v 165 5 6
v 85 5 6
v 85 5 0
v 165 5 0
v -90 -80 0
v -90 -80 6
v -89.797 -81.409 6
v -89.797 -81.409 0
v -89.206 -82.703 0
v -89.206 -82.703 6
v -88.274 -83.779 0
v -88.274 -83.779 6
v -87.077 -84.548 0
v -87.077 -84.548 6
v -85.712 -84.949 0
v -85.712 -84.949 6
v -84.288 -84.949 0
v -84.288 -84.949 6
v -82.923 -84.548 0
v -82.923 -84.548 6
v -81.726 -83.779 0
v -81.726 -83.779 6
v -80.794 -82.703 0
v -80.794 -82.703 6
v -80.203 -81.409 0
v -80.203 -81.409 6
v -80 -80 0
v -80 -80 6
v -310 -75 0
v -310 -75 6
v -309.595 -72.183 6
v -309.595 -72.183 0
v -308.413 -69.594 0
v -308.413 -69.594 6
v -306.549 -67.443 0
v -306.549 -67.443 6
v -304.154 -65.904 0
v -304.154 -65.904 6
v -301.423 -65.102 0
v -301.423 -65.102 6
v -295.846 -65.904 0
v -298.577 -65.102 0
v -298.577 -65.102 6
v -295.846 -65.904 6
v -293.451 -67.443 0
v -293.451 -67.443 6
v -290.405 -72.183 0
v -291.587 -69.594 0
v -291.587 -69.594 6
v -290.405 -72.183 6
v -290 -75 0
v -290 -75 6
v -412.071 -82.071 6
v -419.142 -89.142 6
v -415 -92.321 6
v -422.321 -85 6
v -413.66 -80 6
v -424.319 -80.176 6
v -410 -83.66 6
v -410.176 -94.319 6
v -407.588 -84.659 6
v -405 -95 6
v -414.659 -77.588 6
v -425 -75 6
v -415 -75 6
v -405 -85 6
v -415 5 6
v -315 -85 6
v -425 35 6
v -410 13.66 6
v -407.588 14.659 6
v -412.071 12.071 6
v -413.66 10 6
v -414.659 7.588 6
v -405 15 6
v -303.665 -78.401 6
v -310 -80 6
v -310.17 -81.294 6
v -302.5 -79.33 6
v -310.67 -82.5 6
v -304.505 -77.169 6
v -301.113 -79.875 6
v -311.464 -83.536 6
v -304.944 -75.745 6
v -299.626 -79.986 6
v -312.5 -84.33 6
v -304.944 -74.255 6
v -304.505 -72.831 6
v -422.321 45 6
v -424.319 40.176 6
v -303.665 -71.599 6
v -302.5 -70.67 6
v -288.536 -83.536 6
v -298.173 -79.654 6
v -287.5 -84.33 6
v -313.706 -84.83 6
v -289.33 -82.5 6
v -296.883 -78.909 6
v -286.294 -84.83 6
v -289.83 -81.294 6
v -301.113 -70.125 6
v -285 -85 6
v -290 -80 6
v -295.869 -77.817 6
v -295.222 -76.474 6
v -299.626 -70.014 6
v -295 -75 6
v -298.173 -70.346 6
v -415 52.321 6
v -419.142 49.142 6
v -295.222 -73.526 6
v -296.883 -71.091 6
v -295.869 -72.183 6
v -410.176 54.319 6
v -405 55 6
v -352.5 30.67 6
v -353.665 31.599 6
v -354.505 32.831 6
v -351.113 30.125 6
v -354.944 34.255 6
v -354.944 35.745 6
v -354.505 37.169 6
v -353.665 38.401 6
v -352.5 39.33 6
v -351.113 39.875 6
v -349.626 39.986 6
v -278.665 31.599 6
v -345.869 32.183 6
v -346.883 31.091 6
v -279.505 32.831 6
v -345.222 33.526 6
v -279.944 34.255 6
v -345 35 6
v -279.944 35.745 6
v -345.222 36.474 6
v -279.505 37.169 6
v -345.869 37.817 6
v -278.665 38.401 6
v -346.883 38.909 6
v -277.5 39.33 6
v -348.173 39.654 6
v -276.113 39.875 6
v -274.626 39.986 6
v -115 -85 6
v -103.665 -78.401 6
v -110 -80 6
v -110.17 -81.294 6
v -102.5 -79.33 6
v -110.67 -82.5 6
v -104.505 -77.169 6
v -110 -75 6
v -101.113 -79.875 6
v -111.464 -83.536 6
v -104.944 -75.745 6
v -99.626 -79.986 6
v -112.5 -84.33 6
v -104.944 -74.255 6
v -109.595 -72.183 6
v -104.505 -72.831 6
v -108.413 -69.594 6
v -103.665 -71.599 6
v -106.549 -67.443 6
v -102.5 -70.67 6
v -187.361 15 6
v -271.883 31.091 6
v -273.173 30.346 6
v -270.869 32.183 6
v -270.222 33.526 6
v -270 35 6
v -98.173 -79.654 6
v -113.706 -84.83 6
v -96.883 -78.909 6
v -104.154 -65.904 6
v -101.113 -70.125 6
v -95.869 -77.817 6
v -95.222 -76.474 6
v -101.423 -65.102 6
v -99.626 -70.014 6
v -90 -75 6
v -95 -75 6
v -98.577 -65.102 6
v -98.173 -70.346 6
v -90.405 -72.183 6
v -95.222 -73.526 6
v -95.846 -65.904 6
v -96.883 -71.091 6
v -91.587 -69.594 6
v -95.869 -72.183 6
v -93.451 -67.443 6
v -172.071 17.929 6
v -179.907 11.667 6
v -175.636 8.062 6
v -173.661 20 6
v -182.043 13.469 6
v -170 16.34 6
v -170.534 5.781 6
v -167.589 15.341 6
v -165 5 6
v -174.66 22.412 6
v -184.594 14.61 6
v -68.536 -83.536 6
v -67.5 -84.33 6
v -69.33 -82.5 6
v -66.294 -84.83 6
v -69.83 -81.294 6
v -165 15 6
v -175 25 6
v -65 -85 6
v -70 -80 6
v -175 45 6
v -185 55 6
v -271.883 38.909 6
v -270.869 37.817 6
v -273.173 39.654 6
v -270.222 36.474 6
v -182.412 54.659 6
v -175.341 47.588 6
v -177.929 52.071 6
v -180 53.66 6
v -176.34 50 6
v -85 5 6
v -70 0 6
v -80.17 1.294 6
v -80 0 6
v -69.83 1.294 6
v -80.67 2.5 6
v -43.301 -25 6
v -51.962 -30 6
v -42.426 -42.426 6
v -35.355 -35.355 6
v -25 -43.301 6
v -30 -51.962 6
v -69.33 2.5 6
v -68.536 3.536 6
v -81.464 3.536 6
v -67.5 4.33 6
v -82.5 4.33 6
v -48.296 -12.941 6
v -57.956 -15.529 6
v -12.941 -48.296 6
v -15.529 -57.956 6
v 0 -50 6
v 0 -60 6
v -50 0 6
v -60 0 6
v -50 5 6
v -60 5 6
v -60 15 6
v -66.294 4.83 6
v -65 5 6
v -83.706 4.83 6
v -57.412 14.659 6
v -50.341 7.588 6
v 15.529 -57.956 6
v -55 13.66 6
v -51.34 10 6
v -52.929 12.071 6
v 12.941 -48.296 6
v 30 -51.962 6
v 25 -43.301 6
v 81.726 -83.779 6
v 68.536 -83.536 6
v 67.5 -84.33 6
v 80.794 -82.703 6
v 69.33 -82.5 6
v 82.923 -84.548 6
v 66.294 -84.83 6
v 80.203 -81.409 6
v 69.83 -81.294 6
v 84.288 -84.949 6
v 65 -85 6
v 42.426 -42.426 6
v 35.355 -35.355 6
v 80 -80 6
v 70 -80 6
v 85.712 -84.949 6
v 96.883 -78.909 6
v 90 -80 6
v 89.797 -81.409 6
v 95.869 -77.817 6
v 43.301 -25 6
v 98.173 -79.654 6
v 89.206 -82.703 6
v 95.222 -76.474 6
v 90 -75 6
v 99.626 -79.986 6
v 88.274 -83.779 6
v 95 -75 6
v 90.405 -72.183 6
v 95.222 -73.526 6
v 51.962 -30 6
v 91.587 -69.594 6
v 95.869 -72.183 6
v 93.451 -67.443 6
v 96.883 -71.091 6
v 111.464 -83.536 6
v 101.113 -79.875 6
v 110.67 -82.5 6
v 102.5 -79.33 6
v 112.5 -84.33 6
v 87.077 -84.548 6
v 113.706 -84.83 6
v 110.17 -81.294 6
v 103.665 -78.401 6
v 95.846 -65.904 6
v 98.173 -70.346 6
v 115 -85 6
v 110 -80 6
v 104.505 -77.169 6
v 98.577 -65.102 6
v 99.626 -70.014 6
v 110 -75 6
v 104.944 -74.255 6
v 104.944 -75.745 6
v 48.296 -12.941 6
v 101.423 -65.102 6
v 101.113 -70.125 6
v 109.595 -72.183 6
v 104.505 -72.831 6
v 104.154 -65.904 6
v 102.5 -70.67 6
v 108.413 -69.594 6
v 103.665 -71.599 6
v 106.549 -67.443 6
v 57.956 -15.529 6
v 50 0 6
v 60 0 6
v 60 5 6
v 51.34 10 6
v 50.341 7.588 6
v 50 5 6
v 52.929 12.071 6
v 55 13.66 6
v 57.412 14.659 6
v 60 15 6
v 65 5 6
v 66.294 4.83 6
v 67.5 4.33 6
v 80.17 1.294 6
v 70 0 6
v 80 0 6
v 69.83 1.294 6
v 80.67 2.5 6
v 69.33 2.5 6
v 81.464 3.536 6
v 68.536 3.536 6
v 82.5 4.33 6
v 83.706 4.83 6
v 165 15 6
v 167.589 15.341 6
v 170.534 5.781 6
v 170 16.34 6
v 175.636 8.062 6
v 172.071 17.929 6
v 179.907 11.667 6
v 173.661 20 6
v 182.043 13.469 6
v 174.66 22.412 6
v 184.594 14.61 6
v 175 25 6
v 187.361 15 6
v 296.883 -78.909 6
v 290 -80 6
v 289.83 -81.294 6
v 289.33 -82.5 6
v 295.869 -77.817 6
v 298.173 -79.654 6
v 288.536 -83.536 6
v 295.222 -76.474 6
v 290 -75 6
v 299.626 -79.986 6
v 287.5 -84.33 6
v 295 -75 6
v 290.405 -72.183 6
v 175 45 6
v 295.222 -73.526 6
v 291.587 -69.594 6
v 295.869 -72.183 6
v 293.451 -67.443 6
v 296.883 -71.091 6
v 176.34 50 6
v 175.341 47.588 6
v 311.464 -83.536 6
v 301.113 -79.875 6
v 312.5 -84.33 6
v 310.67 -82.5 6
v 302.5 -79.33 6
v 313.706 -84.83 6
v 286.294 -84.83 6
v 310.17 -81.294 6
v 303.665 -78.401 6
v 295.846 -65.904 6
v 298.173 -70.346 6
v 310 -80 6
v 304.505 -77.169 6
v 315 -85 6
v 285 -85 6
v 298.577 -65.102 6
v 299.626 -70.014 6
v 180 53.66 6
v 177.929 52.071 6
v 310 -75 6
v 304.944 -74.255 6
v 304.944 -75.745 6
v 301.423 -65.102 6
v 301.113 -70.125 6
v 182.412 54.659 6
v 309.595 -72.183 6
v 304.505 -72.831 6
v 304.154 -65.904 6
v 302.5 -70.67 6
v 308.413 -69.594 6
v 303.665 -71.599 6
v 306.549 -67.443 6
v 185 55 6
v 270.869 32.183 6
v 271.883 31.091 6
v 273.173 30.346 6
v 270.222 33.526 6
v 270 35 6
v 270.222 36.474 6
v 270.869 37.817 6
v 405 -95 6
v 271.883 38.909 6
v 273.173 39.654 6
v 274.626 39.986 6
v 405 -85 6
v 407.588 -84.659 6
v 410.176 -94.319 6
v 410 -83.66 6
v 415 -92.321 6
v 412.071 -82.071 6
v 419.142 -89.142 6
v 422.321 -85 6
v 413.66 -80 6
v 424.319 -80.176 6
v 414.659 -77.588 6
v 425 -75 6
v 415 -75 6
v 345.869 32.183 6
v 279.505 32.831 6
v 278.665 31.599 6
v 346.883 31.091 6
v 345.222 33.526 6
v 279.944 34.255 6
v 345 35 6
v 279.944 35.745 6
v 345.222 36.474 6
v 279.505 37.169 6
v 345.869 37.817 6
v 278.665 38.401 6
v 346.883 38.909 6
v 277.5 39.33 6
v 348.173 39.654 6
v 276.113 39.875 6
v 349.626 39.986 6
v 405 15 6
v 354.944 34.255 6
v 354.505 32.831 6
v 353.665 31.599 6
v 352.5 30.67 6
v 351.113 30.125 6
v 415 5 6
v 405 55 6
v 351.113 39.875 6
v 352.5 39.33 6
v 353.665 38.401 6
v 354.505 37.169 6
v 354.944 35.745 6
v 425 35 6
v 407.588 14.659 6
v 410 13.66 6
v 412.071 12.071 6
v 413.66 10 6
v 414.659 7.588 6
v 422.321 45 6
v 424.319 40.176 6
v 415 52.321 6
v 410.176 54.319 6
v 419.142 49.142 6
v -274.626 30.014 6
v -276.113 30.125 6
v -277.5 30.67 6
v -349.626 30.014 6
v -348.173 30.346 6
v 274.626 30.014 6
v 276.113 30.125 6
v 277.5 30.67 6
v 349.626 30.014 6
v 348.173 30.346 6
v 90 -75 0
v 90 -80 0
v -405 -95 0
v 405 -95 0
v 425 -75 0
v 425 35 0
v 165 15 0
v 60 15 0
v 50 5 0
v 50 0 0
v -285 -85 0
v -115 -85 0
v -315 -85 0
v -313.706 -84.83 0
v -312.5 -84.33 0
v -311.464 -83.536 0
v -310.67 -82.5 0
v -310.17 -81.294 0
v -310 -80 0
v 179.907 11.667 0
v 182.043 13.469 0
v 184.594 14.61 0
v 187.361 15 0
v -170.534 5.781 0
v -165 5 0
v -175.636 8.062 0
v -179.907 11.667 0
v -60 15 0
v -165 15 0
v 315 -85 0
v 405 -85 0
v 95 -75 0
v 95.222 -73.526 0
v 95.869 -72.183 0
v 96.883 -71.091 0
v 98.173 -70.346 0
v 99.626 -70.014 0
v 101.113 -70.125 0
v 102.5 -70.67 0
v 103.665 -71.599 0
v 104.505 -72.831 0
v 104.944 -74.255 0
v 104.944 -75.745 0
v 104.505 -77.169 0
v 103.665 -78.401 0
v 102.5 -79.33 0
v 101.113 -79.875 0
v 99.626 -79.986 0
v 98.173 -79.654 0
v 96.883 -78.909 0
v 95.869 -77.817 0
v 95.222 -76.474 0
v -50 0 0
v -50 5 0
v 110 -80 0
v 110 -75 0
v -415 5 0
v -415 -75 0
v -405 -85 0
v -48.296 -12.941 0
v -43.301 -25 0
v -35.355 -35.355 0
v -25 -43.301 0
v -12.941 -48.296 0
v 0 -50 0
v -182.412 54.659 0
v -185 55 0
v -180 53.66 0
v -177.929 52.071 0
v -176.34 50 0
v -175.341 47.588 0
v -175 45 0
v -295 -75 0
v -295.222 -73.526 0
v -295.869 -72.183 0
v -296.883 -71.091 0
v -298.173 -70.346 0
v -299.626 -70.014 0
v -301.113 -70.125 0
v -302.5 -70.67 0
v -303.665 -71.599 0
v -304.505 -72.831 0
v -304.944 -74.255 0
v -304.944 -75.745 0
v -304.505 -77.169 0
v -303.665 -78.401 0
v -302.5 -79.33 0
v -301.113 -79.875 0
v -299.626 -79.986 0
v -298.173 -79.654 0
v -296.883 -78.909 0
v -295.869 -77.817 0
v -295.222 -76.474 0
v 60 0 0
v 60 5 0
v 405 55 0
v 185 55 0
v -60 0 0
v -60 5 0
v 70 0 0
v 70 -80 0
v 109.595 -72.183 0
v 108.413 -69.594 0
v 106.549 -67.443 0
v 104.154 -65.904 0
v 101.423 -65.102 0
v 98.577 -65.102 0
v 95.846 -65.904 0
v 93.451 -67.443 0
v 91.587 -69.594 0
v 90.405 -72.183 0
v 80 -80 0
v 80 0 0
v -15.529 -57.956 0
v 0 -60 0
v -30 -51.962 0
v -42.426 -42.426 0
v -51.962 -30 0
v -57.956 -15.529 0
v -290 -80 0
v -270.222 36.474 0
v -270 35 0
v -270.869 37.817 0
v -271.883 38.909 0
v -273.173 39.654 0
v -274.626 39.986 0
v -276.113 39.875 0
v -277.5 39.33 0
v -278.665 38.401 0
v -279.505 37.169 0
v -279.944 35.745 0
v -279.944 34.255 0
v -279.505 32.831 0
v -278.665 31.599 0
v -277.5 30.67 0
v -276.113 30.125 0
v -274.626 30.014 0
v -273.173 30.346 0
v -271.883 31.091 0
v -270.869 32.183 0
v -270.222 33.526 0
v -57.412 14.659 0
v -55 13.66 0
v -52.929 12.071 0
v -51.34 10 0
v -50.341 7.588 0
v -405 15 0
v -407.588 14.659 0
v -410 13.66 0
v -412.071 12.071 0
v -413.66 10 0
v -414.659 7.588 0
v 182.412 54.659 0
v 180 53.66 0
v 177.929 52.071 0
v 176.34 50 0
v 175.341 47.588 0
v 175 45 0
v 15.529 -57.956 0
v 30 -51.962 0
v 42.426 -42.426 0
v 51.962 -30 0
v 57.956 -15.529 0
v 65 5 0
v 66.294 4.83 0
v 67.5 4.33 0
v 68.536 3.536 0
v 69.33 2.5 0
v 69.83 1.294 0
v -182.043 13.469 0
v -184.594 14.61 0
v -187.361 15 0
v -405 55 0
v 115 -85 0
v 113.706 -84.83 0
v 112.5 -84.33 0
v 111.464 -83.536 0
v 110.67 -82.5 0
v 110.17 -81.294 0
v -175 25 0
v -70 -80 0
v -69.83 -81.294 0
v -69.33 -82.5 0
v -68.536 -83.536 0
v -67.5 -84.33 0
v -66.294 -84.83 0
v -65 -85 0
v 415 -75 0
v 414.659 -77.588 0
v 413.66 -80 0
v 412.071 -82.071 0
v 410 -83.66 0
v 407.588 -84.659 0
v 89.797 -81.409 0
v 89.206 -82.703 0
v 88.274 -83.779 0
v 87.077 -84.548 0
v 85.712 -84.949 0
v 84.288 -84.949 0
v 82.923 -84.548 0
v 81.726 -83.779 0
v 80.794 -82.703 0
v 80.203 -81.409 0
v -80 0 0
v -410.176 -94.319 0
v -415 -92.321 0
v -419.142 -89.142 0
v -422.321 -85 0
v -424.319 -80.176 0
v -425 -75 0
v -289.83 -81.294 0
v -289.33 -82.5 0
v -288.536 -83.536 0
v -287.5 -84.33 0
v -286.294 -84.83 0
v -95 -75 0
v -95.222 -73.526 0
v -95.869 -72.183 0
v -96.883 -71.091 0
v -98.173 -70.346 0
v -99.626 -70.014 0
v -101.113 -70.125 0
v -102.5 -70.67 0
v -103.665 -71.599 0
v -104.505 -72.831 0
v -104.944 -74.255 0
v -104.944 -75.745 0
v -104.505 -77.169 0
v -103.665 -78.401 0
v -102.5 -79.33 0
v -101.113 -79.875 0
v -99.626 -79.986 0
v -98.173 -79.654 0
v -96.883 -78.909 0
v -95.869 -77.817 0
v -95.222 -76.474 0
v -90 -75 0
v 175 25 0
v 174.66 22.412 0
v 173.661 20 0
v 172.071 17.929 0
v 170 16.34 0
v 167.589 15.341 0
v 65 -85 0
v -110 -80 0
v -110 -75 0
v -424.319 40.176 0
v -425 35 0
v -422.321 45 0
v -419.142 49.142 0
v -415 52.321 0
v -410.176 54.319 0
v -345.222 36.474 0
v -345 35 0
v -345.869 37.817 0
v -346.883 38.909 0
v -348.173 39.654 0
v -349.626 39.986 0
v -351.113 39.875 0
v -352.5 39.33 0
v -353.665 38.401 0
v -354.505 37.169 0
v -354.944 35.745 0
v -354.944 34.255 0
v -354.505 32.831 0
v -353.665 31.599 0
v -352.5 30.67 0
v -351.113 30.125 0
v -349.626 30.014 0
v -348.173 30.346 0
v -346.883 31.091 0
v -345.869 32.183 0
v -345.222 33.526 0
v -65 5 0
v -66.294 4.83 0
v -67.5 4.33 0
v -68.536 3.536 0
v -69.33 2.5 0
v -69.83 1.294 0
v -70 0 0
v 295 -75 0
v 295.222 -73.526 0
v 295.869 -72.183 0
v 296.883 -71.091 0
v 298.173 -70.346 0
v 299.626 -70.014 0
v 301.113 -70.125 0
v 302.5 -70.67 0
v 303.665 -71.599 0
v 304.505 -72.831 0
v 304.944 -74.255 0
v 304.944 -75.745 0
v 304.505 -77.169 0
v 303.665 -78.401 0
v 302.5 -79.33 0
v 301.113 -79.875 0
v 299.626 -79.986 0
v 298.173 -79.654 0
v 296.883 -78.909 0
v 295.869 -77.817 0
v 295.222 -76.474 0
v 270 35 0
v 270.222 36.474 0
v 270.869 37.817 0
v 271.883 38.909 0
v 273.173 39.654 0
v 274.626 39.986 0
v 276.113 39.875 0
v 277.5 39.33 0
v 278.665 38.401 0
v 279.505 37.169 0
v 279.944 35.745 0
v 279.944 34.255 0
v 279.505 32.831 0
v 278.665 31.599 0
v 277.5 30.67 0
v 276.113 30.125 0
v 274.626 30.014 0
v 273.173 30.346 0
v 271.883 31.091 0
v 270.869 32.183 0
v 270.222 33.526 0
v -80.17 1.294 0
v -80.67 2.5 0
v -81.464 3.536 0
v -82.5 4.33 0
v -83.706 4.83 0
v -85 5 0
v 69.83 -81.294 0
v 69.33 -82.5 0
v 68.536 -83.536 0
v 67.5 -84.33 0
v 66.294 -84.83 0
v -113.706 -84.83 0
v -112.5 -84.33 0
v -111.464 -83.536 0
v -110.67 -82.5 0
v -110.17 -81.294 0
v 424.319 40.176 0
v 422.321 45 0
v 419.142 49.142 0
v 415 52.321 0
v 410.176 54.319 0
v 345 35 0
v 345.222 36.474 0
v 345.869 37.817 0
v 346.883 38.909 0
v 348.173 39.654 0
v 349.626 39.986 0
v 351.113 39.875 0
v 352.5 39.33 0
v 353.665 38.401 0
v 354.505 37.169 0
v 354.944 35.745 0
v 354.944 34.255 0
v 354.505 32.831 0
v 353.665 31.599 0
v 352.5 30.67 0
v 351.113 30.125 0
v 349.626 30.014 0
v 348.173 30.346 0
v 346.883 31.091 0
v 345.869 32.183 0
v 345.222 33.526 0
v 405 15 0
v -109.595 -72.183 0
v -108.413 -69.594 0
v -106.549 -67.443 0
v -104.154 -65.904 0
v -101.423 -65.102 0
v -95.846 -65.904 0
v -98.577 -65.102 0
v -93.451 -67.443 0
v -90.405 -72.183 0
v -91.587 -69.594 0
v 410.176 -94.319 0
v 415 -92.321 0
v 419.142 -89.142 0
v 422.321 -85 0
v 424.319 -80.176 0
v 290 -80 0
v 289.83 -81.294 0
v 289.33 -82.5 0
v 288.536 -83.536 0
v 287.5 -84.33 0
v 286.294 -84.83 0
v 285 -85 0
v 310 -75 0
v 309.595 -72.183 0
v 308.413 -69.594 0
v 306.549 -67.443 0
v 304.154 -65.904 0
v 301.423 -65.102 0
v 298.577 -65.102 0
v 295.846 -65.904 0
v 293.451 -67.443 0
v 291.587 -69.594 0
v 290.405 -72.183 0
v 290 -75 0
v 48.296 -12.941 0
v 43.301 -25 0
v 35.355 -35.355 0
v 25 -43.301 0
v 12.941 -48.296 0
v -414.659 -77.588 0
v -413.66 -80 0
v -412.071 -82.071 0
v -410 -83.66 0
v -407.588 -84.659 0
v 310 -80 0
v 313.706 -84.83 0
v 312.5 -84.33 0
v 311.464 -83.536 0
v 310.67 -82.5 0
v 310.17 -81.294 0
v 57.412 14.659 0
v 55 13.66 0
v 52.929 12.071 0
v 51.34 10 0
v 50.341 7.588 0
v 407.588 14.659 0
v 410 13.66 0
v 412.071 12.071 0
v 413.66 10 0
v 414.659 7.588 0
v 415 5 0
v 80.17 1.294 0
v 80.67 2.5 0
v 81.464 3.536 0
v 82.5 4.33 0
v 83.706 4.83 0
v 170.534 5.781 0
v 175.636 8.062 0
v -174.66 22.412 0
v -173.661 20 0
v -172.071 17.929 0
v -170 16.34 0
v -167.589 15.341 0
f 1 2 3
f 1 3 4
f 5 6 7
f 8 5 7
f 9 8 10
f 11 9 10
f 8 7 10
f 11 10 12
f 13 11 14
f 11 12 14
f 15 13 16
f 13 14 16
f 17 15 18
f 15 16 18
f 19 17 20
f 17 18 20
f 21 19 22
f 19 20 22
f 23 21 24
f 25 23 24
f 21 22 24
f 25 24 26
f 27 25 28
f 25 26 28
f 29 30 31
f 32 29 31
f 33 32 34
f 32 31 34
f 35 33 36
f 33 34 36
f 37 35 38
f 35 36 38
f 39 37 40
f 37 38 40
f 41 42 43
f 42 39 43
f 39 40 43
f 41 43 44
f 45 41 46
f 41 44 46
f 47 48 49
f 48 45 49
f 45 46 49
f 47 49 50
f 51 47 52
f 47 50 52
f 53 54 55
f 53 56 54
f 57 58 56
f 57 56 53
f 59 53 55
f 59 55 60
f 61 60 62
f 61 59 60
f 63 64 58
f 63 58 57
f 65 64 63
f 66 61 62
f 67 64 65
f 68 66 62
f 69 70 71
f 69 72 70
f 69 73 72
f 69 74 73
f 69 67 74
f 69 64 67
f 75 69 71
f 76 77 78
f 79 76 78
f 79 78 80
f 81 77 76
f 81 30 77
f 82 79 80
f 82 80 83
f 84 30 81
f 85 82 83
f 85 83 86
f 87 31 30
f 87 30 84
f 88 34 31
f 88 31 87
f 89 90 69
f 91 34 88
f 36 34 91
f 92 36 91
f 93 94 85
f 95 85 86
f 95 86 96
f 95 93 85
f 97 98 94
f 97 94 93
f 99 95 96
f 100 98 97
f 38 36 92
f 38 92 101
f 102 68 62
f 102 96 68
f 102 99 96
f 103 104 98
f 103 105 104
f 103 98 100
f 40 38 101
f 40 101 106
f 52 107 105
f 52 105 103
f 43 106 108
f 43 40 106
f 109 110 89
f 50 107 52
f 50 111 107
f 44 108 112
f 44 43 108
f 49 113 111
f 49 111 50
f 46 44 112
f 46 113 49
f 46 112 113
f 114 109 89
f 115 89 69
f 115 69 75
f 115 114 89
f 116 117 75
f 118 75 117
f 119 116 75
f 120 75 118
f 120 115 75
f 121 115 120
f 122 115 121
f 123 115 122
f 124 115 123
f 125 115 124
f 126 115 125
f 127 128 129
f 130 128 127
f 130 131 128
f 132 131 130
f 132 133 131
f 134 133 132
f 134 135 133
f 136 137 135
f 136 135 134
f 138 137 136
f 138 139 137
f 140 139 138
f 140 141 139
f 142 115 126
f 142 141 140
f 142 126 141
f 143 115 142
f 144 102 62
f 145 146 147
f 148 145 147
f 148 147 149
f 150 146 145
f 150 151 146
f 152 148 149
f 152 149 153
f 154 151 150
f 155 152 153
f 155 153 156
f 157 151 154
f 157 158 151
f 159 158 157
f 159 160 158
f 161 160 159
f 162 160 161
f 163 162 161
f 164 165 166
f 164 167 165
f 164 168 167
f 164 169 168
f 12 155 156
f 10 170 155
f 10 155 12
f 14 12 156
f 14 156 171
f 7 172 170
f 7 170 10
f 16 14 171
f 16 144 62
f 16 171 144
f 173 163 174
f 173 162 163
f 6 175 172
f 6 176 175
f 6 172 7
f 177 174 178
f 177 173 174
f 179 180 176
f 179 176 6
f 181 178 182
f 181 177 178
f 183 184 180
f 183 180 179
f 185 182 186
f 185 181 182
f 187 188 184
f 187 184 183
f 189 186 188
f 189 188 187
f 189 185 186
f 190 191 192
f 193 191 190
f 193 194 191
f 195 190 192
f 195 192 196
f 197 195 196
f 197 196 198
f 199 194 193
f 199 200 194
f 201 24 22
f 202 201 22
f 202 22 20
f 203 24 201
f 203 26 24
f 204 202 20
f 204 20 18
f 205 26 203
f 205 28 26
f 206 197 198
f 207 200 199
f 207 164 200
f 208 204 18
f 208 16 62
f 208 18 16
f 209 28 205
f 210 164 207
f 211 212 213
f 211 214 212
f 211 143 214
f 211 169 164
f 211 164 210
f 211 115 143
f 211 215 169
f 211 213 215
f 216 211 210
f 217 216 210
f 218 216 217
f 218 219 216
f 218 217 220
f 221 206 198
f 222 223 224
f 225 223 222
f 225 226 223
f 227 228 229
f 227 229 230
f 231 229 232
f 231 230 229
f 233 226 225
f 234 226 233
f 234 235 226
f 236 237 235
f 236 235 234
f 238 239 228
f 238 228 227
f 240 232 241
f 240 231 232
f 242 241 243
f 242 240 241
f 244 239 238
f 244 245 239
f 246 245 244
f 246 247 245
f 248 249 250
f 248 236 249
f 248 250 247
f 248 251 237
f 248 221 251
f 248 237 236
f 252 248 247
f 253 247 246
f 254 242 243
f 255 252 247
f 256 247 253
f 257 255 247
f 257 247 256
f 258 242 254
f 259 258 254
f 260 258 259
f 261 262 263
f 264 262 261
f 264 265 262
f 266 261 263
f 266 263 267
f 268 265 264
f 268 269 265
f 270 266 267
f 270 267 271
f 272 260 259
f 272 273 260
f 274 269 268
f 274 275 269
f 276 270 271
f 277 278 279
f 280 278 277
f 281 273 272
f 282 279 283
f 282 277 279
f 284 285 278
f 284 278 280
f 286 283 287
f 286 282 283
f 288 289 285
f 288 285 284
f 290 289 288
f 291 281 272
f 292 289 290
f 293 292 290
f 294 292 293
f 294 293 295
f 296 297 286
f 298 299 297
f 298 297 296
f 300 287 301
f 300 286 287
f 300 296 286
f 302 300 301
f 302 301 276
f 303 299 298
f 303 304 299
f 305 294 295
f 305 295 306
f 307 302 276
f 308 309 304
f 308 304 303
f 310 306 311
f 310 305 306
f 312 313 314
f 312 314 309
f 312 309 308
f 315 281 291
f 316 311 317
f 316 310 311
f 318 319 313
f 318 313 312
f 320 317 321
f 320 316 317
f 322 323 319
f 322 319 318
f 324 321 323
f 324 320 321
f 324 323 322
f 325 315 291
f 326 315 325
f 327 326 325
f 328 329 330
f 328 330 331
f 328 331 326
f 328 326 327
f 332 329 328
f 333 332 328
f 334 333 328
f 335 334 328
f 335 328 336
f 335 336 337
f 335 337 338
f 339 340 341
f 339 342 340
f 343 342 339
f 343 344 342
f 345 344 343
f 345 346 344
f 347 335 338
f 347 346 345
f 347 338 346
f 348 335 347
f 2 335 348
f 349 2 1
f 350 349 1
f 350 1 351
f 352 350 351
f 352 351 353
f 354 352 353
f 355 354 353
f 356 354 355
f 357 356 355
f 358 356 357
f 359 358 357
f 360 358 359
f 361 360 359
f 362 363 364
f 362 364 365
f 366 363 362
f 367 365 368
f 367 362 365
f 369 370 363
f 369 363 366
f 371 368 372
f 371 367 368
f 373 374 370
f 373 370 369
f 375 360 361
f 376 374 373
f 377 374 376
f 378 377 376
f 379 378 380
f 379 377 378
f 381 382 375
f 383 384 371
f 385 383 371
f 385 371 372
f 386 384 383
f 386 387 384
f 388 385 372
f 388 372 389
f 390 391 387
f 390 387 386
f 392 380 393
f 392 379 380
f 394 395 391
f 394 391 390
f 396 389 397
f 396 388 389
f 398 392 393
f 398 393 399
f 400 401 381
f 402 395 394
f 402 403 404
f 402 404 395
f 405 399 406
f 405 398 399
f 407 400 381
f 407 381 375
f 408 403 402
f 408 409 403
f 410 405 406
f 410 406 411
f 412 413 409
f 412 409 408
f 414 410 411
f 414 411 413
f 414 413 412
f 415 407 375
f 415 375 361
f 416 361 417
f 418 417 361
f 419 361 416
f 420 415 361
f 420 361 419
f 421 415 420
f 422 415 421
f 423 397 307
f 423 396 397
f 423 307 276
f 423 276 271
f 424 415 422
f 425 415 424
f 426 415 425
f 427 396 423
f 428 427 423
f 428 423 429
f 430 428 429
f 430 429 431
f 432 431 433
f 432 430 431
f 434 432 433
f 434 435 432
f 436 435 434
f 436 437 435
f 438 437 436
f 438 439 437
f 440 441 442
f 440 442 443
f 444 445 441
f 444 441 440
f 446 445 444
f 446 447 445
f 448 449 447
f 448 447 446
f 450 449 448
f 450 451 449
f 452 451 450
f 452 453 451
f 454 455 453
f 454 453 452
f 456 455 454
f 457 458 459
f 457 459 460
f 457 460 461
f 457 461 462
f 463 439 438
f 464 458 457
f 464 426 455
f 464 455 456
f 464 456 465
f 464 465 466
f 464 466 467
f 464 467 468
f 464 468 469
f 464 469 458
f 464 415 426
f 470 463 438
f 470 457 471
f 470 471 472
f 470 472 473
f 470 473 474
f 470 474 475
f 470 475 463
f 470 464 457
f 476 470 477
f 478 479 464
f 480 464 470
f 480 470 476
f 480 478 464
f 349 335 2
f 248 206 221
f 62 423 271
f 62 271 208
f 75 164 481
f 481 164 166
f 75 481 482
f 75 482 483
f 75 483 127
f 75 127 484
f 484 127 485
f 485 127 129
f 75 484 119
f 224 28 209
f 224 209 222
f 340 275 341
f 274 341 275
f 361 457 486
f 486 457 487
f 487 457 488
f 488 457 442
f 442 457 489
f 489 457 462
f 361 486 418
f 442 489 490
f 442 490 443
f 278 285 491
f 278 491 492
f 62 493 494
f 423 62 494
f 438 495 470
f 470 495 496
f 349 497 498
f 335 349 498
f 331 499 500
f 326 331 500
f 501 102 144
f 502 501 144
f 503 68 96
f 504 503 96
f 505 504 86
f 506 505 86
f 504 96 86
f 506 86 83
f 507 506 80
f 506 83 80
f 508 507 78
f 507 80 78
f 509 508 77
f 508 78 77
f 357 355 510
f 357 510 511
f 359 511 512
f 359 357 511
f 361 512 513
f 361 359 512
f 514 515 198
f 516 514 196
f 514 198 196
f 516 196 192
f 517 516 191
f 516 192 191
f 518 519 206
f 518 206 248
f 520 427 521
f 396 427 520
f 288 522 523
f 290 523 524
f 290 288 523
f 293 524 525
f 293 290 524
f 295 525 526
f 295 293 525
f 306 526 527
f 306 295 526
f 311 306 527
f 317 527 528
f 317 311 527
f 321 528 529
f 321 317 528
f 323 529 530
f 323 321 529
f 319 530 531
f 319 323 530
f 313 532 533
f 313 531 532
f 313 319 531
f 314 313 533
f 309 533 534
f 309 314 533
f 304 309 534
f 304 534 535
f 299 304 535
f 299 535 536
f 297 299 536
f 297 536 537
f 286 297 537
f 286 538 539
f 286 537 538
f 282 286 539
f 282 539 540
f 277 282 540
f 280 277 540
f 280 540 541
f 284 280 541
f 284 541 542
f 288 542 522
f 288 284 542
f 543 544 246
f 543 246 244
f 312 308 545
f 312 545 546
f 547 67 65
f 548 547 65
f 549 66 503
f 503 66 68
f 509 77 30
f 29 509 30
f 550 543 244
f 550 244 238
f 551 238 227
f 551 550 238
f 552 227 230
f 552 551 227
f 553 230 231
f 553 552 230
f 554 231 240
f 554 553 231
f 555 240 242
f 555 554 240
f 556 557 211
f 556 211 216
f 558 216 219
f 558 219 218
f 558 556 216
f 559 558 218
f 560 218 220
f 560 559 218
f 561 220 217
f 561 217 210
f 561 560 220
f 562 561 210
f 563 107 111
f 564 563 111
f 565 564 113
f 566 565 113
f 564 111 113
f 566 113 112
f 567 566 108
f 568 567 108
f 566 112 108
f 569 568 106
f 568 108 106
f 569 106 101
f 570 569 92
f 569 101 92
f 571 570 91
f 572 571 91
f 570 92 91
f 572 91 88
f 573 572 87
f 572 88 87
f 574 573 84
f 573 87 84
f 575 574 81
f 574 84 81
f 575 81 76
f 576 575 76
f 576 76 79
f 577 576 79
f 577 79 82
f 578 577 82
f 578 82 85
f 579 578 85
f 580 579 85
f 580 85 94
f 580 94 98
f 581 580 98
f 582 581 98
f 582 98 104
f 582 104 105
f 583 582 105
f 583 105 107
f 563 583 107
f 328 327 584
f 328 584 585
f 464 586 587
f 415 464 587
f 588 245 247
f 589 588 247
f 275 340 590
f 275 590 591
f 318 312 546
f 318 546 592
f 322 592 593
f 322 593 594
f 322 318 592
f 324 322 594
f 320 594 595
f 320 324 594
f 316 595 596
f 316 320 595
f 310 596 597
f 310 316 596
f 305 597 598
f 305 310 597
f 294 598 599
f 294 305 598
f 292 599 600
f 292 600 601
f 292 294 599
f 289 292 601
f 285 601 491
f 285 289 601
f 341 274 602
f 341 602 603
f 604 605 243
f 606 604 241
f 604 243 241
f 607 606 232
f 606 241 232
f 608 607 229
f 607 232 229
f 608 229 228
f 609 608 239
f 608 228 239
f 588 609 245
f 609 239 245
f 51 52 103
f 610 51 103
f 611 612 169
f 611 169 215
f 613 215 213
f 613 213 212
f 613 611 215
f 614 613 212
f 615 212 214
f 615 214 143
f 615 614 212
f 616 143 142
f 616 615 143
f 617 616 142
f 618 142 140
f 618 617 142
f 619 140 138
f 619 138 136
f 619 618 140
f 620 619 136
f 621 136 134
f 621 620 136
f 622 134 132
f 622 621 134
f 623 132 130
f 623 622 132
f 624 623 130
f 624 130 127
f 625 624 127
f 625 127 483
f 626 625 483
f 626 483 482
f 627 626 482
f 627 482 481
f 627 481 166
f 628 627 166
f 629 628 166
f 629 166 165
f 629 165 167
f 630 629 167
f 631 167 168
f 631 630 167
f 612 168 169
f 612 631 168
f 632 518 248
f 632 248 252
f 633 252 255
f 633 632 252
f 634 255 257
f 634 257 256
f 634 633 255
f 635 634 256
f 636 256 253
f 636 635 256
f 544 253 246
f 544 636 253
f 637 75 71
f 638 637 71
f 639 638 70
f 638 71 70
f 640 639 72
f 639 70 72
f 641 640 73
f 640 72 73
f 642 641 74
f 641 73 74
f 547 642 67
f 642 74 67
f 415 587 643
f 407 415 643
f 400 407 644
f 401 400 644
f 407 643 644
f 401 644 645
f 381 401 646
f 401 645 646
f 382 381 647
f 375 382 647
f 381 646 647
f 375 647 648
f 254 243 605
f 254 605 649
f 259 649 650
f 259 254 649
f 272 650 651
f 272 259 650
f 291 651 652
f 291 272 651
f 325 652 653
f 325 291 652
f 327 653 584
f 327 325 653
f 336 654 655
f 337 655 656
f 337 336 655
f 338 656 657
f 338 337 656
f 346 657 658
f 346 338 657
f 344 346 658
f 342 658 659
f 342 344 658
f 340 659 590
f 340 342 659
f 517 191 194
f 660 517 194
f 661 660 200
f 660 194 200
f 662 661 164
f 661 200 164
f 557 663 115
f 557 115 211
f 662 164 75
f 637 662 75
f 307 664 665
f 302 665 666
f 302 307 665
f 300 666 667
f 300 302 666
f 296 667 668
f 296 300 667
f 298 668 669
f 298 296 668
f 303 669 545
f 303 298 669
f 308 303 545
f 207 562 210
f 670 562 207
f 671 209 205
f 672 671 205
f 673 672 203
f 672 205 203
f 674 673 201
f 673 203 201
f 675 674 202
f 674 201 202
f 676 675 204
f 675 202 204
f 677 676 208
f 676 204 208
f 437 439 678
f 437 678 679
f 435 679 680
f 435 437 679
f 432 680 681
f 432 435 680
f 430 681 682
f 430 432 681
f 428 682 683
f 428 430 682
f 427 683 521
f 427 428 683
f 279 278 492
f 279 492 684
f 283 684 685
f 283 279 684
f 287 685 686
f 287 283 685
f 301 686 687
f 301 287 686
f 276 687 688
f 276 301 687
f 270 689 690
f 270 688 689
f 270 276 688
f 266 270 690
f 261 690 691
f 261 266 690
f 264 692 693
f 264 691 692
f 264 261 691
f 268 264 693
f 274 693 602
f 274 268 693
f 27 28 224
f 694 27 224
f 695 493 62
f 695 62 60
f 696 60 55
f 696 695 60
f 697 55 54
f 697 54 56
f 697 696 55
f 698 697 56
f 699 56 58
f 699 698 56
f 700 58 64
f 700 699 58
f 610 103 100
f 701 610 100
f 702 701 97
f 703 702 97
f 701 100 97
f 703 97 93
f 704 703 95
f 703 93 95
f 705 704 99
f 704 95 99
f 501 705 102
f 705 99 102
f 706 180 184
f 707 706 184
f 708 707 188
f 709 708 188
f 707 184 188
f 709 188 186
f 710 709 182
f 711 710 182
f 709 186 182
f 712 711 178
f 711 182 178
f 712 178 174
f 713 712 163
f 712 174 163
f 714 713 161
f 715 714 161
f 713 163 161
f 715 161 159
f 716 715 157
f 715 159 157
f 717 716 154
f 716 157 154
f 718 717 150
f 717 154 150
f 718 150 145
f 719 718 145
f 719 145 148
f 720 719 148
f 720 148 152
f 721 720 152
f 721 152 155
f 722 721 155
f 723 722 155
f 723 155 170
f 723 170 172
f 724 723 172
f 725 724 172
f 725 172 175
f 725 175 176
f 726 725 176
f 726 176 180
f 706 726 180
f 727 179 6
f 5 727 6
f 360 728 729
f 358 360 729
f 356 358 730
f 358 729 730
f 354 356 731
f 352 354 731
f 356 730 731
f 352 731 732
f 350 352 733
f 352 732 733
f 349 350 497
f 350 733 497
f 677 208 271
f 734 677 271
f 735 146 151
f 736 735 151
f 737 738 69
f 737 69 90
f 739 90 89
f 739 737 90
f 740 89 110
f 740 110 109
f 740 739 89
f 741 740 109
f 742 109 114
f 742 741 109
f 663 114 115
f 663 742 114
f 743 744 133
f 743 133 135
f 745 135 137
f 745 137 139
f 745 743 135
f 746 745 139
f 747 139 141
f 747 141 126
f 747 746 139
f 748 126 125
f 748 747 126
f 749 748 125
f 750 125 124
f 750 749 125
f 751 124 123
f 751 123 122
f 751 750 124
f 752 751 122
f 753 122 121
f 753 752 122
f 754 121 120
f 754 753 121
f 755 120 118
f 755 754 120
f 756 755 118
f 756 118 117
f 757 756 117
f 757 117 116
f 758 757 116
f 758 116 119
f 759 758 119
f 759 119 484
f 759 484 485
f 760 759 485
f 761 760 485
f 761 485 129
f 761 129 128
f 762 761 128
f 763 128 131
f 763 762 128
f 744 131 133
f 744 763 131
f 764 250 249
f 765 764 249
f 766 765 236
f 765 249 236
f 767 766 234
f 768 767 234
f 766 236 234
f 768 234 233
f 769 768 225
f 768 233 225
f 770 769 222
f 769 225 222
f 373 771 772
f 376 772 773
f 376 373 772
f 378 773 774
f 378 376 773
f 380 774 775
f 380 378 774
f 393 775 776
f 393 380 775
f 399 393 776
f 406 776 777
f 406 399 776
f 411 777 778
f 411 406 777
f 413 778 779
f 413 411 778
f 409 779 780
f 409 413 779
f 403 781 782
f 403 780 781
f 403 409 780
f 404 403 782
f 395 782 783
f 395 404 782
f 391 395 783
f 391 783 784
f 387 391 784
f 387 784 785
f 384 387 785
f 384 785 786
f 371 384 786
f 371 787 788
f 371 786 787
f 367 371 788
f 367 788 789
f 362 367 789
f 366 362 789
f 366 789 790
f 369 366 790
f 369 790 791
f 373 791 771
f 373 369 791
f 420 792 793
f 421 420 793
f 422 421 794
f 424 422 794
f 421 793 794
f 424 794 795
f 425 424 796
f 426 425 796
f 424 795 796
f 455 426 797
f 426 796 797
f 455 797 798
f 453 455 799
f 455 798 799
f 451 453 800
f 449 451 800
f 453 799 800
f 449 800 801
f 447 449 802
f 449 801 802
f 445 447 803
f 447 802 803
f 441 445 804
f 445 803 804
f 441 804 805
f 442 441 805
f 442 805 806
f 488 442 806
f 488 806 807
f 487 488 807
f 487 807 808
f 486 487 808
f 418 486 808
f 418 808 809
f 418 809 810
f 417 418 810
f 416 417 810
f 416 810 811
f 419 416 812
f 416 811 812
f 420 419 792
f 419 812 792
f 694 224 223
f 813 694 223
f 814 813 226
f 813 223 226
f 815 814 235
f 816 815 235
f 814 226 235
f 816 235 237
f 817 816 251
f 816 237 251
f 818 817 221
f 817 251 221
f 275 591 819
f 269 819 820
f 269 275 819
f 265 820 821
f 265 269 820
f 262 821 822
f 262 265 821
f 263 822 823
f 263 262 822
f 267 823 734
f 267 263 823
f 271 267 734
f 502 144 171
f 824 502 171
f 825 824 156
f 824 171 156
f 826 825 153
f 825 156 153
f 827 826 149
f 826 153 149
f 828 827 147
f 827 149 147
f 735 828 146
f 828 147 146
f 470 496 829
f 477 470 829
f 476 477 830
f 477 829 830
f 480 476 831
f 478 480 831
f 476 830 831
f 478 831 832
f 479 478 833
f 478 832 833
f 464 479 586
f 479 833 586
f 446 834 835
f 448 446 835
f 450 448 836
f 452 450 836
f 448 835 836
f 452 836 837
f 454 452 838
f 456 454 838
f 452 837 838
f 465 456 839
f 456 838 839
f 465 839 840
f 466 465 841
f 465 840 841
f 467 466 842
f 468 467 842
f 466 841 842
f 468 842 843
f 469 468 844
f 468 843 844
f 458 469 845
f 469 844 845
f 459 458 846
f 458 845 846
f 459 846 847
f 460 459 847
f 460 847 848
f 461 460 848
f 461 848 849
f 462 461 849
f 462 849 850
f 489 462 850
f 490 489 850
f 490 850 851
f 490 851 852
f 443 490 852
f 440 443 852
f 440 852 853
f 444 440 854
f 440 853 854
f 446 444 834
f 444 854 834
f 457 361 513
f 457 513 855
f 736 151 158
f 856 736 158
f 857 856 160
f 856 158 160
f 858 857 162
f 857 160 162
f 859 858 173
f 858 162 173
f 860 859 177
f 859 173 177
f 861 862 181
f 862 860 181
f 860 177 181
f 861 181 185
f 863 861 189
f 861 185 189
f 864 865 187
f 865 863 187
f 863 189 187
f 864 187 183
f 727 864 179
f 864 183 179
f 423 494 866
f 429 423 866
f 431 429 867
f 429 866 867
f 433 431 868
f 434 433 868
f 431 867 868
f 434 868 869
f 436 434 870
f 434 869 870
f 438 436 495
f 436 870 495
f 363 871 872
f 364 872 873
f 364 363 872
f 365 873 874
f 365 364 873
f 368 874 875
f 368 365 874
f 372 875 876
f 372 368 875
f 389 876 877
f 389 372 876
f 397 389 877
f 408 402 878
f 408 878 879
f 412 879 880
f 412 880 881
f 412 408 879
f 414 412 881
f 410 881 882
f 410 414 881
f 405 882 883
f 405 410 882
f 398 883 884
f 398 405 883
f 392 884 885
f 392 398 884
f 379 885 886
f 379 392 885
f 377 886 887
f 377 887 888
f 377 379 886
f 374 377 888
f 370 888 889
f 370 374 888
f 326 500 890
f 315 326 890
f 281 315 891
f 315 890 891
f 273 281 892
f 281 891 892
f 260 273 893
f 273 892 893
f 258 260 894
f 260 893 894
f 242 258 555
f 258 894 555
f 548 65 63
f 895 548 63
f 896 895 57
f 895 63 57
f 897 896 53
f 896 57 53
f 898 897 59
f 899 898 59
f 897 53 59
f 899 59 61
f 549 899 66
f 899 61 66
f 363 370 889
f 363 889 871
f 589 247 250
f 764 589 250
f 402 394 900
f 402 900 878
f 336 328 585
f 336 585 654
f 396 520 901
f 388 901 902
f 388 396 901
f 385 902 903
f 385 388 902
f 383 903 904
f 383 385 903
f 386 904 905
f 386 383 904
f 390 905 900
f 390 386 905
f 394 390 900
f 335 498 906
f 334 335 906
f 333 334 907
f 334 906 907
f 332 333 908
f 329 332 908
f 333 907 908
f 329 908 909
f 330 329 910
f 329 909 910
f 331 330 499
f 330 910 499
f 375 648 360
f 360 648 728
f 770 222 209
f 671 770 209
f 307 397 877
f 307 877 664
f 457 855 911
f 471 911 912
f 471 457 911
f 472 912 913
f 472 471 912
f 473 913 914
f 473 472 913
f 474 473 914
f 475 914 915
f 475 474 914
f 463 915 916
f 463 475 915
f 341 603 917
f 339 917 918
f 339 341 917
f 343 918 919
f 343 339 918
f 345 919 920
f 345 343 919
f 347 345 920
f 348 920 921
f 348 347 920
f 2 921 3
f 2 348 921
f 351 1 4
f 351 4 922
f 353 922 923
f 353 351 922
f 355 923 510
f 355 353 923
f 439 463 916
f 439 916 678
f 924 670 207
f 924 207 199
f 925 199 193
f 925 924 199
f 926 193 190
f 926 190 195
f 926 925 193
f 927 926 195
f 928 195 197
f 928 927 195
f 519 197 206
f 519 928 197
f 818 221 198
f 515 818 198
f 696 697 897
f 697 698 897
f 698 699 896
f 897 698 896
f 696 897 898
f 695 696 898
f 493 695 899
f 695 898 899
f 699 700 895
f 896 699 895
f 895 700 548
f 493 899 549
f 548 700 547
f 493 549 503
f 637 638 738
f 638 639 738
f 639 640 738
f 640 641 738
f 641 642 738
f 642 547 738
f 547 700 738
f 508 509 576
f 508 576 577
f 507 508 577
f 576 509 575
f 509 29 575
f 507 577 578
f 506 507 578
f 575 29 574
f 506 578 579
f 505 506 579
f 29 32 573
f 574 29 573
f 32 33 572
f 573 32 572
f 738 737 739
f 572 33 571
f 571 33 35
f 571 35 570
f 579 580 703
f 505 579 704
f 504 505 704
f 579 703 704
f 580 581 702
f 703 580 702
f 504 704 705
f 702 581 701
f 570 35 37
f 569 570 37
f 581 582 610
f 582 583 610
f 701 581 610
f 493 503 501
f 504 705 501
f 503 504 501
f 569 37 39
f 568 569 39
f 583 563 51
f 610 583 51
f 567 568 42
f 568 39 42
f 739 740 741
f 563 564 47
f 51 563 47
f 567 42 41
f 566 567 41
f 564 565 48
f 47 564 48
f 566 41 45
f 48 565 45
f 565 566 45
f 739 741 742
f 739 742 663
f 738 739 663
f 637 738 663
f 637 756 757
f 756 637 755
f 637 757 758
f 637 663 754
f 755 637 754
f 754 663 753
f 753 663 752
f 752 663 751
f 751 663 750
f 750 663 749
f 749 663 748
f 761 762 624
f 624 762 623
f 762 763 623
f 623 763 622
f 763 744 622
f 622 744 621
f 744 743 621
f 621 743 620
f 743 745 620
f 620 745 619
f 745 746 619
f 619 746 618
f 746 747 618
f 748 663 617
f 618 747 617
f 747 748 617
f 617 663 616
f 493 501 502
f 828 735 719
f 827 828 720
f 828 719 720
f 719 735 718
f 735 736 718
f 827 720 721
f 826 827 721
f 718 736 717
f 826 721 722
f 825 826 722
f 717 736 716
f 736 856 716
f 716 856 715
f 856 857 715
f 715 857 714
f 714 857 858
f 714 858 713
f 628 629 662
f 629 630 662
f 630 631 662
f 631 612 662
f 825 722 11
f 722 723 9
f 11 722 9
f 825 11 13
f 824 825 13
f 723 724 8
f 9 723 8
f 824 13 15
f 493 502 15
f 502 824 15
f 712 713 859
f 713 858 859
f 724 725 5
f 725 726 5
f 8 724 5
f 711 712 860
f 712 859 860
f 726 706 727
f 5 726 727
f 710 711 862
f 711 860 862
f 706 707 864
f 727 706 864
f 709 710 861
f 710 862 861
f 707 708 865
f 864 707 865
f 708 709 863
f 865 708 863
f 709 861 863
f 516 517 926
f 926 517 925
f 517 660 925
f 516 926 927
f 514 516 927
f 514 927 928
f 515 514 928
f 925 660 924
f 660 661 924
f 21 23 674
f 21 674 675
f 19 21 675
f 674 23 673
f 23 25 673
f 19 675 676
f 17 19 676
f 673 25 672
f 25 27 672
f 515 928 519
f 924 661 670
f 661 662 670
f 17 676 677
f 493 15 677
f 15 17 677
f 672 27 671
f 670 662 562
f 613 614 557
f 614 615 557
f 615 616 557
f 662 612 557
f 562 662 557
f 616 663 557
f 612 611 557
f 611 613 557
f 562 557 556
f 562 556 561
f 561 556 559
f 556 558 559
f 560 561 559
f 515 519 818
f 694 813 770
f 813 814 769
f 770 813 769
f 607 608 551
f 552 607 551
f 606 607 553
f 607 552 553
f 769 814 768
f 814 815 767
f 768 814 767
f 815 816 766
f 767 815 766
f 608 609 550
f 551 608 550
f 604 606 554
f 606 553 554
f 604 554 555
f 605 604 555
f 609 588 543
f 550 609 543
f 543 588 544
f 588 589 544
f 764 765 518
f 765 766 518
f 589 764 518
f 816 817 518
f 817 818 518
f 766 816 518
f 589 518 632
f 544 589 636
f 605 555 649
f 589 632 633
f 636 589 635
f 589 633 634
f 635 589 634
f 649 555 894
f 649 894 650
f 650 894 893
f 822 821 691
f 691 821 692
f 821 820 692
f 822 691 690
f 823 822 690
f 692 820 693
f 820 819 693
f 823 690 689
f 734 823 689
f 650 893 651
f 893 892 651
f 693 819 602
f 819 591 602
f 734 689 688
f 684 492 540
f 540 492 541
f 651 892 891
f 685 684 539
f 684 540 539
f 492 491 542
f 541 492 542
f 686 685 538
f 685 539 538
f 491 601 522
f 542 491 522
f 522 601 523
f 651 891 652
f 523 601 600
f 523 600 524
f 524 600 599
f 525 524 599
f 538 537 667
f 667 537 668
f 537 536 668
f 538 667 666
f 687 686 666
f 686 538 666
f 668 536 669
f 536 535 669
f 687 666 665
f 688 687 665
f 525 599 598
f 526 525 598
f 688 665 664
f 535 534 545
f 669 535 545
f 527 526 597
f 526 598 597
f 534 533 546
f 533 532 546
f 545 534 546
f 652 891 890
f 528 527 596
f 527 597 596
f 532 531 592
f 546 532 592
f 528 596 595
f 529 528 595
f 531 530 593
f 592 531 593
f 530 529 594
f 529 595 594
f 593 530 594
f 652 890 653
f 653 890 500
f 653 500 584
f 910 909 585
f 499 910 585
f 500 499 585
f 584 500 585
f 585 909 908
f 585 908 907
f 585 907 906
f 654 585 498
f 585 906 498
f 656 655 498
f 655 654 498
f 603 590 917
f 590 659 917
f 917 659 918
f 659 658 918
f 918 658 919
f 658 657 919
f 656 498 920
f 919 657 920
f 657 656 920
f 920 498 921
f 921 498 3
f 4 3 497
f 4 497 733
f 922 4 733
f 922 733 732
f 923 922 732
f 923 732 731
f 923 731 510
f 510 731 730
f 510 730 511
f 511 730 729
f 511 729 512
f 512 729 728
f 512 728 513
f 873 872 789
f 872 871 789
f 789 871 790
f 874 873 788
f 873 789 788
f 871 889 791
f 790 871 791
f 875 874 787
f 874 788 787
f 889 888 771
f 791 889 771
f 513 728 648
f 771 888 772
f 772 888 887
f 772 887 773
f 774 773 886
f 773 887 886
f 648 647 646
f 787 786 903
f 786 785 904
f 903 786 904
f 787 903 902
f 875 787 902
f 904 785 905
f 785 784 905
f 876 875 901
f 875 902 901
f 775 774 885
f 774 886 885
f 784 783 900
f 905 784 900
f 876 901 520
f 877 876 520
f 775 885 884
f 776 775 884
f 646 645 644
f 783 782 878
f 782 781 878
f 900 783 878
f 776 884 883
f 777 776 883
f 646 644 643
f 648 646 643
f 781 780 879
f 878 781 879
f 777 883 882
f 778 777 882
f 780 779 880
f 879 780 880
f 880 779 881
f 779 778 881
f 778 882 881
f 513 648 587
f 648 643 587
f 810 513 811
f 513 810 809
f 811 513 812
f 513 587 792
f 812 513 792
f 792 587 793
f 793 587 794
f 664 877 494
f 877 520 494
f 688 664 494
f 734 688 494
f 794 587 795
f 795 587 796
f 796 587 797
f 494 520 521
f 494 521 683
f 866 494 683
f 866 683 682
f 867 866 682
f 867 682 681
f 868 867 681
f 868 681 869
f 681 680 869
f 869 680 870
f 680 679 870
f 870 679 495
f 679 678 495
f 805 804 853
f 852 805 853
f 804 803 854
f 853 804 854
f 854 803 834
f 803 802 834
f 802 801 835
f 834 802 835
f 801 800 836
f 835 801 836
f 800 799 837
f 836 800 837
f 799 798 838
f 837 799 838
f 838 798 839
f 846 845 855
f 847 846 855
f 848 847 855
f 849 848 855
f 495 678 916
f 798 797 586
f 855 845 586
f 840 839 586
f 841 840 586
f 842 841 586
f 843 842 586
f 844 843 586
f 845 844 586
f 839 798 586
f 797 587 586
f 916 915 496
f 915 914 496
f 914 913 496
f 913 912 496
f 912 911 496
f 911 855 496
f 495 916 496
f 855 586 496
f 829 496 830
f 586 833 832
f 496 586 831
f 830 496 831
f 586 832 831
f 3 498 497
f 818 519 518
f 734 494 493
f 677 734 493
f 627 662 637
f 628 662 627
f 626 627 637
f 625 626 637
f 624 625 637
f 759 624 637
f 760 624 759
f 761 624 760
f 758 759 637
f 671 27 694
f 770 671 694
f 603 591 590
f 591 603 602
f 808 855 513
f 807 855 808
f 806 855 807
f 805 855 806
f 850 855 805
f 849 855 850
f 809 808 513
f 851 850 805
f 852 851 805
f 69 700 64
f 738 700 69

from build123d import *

# Parameters (mm, degrees)
SKETCH1_R           = 5
BOSS_EXTRUDE1_DEPTH = 6
SKETCH2_R           = 5
CUT_EXTRUDE1_DEPTH  = 436.529562716


with BuildPart() as part:
    # Sketch1 → Boss-Extrude1 (new body)
    with BuildSketch(Plane.XY):
        with BuildLine():
            Line((-425, -75), (-425, 35))
            ThreePointArc((-425, 35), (-419.142135624, 49.142135624), (-405, 55))
            Line((-405, 55), (-185.000330481, 55))
            ThreePointArc((-185.000330481, 55), (-177.92926267, 52.071067812), (-175.000330481, 45))
            Line((-175.000330481, 45), (-175.000330481, 25))
            ThreePointArc((-175.000330481, 25), (-172.071398293, 17.928932188), (-165.000330481, 15))
            Line((-165.000330481, 15), (-60, 15))
            ThreePointArc((-60, 15), (-52.928932188, 12.071067812), (-50, 5))
            Line((-50, 5), (-50, 0))
            ThreePointArc((-50, 0), (-35.355339059, -35.355339059), (0, -50))
            Line((0, -50), (0, -95))
            Line((0, -95), (-405, -95))
            ThreePointArc((-405, -95), (-419.142135624, -89.142135624), (-425, -75))
        make_face()
        with Locations((-350, 35)):
            Circle(SKETCH1_R, mode=Mode.SUBTRACT)
        with Locations((-275, 35)):
            Circle(SKETCH1_R, mode=Mode.SUBTRACT)
    boss_extrude1 = extrude(amount=BOSS_EXTRUDE1_DEPTH)

    # Mirror1: Boss-Extrude1 across plane
    add(boss_extrude1.mirror(Plane(origin=(0, -50, 6), x_dir=(0, 0, 1), z_dir=(-1, 0, 0))))

    # Sketch2 → Cut-Extrude1 (cut, through all)
    with BuildSketch(Plane.XY.offset(6)):
        with BuildLine():
            ThreePointArc((-310, -75), (-300, -65), (-290, -75))
            Line((-290, -75), (-290, -80))
            ThreePointArc((-290, -80), (-288.535533906, -83.535533906), (-285, -85))
            Line((-285, -85), (-115, -85))
            ThreePointArc((-115, -85), (-111.464466094, -83.535533906), (-110, -80))
            Line((-110, -80), (-110, -75))
            ThreePointArc((-110, -75), (-100, -65), (-90, -75))
            Line((-90, -75), (-90, -80))
            ThreePointArc((-90, -80), (-85, -85), (-80, -80))
            Line((-80, -80), (-80, 0))
            ThreePointArc((-80, 0), (-81.464466094, 3.535533906), (-85, 5))
            Line((-85, 5), (-165.000330481, 5))
            ThreePointArc((-165.000330481, 5), (-173.165296291, 6.742581416), (-179.907450331, 11.666666667))
            ThreePointArc((-179.907450331, 11.666666667), (-183.278527352, 14.128709292), (-187.361010256, 15))
            Line((-187.361010256, 15), (-405, 15))
            ThreePointArc((-405, 15), (-412.071067812, 12.071067812), (-415, 5))
            Line((-415, 5), (-415, -75))
            ThreePointArc((-415, -75), (-412.071067812, -82.071067812), (-405, -85))
            Line((-405, -85), (-315, -85))
            ThreePointArc((-315, -85), (-311.464466094, -83.535533906), (-310, -80))
            Line((-310, -80), (-310, -75))
        make_face()
        with BuildLine():
            ThreePointArc((-70, -80), (-68.535533906, -83.535533906), (-65, -85))
            Line((-65, -85), (0, -85))
            Line((0, -85), (0, -60))
            ThreePointArc((0, -60), (-42.426406871, -42.426406871), (-60, 0))
            Line((-60, 0), (-60, 5))
            Line((-60, 5), (-65, 5))
            ThreePointArc((-65, 5), (-68.535533906, 3.535533906), (-70, 0))
            Line((-70, 0), (-70, -80))
        make_face()
        with Locations((-300, -75)):
            Circle(SKETCH2_R)
        with Locations((-100, -75)):
            Circle(SKETCH2_R)
    cut_extrude1 = extrude(amount=-CUT_EXTRUDE1_DEPTH, mode=Mode.SUBTRACT)

    # Mirror2: Cut-Extrude1 across plane
    add(cut_extrude1.mirror(Plane(origin=(0, 0, 0), x_dir=(0, 0, 1), z_dir=(1, 0, 0))), mode=Mode.SUBTRACT)


solid = part.part
